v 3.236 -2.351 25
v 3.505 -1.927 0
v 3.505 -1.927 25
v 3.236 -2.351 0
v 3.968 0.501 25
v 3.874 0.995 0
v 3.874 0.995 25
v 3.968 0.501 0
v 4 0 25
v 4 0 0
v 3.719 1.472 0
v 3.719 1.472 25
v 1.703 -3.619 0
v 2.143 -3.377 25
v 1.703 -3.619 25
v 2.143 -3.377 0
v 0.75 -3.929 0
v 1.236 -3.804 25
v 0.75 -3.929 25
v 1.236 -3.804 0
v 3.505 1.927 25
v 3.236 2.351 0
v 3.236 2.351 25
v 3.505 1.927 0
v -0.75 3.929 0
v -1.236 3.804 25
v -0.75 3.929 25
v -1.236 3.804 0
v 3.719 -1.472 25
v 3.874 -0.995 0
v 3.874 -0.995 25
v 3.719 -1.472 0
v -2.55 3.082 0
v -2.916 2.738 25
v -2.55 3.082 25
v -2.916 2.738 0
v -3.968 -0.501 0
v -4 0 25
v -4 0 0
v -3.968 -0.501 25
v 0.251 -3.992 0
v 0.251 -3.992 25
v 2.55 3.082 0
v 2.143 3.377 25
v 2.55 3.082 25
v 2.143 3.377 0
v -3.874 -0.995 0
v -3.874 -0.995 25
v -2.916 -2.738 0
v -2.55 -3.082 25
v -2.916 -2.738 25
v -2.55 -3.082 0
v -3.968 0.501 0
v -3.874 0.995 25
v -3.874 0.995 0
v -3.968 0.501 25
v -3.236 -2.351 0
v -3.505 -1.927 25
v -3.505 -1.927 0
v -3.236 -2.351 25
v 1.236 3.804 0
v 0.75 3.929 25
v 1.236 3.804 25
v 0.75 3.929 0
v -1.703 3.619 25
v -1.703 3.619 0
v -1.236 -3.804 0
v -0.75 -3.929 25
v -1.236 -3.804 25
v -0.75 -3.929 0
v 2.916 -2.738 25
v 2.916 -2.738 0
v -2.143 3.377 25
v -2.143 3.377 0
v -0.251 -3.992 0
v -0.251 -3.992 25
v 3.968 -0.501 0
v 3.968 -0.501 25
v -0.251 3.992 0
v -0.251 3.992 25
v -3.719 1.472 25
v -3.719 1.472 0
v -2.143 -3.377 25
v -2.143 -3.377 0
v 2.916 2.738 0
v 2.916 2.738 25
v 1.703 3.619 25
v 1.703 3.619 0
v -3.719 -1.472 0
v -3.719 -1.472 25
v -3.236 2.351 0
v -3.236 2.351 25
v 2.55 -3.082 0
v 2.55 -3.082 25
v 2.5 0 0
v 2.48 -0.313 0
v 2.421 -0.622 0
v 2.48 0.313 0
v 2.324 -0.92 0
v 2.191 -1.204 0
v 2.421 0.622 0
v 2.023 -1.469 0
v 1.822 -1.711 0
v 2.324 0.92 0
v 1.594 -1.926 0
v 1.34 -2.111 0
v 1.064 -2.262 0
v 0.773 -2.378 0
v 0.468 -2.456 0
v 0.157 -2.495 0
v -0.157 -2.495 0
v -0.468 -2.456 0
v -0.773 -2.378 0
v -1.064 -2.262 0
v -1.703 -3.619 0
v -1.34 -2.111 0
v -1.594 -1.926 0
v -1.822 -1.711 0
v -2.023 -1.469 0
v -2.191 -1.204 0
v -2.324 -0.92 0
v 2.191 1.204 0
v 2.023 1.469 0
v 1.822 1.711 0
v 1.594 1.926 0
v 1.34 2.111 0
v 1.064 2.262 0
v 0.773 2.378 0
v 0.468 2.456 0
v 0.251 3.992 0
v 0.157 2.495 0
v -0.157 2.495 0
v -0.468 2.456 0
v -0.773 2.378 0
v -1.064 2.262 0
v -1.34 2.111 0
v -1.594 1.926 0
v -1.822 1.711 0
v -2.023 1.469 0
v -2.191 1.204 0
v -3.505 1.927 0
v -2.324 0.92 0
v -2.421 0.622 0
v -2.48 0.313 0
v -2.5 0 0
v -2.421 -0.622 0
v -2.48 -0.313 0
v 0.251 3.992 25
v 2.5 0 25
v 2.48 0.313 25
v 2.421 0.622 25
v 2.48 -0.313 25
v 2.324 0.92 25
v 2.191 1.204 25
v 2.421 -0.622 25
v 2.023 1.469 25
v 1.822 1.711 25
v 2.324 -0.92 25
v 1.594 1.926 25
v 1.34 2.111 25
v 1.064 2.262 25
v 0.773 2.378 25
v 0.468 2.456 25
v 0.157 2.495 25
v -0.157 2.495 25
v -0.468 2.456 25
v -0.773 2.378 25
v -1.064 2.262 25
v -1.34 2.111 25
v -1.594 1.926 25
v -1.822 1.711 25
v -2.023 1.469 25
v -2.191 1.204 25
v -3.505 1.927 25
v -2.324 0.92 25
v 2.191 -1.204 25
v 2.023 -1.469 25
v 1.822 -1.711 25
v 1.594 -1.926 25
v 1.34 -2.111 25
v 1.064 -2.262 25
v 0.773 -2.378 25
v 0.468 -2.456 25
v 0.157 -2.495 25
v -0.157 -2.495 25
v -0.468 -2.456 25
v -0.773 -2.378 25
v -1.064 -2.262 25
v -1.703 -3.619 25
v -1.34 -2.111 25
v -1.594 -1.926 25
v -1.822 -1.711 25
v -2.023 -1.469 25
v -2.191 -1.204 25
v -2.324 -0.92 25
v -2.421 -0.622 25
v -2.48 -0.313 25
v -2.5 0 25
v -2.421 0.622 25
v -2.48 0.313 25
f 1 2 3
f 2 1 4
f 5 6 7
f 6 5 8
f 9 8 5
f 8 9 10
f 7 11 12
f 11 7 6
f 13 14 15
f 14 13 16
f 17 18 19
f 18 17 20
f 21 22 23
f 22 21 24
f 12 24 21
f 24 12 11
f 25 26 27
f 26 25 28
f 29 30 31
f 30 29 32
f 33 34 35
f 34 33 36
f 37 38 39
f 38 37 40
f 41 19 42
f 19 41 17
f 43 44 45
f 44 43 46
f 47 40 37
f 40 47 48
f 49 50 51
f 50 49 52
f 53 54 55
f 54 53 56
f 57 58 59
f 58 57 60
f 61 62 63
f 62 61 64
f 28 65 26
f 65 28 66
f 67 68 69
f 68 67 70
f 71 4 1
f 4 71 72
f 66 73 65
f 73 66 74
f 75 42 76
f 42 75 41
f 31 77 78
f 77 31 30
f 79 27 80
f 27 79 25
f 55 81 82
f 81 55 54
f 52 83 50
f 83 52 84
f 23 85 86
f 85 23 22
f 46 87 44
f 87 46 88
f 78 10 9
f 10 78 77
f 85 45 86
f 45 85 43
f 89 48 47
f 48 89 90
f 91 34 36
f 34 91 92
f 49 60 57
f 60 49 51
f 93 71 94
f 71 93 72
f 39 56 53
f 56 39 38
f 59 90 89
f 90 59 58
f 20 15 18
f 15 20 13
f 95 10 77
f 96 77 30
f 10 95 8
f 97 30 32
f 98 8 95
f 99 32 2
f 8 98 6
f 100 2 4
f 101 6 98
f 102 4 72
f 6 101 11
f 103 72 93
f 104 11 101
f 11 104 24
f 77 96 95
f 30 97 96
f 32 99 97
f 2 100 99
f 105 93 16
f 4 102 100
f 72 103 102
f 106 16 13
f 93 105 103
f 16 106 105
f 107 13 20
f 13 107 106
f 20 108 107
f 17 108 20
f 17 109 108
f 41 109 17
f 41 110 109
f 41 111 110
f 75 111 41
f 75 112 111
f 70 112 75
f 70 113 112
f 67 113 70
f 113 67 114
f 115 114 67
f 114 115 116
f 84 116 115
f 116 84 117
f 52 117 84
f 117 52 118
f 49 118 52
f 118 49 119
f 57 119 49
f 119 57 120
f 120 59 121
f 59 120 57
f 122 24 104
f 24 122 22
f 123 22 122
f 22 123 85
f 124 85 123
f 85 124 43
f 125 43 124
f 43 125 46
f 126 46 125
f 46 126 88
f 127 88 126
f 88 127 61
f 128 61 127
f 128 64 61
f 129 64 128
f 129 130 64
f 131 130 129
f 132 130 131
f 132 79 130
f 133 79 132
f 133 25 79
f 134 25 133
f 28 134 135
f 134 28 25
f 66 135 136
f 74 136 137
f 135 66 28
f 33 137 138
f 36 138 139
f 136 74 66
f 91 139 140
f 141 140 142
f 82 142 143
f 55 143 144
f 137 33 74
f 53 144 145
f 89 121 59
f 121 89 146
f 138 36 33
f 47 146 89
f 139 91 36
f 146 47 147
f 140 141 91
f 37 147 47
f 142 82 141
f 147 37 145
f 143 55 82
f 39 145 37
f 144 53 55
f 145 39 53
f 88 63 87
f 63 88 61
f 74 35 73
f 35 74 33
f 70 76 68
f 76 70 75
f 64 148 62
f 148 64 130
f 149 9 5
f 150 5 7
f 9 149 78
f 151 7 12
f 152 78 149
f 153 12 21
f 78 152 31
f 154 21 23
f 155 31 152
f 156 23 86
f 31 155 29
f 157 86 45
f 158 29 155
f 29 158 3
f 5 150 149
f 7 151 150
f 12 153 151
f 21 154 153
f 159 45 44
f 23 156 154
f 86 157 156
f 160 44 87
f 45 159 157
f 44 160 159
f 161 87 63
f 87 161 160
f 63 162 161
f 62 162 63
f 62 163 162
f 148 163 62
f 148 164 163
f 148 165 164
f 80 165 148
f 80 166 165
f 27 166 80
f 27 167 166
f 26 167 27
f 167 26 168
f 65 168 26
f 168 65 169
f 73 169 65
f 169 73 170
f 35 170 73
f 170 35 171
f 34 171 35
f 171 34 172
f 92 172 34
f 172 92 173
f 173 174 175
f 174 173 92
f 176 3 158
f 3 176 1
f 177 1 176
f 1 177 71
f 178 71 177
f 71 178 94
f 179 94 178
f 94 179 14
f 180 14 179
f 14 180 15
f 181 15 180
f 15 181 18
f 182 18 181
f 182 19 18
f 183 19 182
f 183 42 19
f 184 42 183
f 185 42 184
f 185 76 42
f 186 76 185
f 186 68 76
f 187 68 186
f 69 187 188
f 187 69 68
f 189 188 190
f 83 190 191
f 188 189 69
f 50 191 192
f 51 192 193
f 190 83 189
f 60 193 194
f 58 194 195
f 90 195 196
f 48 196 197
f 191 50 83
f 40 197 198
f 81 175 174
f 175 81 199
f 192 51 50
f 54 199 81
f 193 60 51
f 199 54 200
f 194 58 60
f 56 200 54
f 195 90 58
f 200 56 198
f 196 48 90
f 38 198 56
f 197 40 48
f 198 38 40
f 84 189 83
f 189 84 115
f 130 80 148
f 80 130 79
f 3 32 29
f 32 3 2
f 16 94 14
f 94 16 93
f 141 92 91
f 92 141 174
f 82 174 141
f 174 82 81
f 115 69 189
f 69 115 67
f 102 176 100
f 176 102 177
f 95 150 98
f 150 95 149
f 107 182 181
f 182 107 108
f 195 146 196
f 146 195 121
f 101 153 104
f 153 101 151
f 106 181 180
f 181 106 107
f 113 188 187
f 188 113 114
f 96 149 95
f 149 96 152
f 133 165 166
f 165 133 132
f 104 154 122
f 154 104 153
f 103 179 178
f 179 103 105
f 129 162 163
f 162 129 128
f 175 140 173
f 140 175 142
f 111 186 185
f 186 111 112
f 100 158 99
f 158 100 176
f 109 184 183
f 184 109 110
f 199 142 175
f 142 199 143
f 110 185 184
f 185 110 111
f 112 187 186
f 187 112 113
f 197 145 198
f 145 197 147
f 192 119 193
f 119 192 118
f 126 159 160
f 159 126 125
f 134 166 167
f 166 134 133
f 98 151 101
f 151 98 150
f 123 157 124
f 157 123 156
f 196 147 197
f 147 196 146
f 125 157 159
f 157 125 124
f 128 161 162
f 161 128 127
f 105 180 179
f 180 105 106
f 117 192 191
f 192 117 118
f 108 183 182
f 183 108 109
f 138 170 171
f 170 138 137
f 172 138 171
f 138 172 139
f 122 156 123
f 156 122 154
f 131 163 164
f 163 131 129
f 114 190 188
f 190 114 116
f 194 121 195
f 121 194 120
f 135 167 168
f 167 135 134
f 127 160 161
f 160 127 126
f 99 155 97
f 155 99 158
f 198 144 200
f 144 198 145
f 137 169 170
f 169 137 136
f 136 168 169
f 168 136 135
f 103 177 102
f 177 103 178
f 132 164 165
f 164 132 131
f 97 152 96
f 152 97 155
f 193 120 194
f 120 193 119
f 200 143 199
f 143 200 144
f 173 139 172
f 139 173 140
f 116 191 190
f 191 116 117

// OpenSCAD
inner_diameter = 5;
outer_diameter = 8;
length = 25;
$fn = 50;
difference() {
cylinder(length,outer_diameter/2,outer_diameter/2);
cylinder(length,inner_diameter/2,inner_diameter/2);
}
